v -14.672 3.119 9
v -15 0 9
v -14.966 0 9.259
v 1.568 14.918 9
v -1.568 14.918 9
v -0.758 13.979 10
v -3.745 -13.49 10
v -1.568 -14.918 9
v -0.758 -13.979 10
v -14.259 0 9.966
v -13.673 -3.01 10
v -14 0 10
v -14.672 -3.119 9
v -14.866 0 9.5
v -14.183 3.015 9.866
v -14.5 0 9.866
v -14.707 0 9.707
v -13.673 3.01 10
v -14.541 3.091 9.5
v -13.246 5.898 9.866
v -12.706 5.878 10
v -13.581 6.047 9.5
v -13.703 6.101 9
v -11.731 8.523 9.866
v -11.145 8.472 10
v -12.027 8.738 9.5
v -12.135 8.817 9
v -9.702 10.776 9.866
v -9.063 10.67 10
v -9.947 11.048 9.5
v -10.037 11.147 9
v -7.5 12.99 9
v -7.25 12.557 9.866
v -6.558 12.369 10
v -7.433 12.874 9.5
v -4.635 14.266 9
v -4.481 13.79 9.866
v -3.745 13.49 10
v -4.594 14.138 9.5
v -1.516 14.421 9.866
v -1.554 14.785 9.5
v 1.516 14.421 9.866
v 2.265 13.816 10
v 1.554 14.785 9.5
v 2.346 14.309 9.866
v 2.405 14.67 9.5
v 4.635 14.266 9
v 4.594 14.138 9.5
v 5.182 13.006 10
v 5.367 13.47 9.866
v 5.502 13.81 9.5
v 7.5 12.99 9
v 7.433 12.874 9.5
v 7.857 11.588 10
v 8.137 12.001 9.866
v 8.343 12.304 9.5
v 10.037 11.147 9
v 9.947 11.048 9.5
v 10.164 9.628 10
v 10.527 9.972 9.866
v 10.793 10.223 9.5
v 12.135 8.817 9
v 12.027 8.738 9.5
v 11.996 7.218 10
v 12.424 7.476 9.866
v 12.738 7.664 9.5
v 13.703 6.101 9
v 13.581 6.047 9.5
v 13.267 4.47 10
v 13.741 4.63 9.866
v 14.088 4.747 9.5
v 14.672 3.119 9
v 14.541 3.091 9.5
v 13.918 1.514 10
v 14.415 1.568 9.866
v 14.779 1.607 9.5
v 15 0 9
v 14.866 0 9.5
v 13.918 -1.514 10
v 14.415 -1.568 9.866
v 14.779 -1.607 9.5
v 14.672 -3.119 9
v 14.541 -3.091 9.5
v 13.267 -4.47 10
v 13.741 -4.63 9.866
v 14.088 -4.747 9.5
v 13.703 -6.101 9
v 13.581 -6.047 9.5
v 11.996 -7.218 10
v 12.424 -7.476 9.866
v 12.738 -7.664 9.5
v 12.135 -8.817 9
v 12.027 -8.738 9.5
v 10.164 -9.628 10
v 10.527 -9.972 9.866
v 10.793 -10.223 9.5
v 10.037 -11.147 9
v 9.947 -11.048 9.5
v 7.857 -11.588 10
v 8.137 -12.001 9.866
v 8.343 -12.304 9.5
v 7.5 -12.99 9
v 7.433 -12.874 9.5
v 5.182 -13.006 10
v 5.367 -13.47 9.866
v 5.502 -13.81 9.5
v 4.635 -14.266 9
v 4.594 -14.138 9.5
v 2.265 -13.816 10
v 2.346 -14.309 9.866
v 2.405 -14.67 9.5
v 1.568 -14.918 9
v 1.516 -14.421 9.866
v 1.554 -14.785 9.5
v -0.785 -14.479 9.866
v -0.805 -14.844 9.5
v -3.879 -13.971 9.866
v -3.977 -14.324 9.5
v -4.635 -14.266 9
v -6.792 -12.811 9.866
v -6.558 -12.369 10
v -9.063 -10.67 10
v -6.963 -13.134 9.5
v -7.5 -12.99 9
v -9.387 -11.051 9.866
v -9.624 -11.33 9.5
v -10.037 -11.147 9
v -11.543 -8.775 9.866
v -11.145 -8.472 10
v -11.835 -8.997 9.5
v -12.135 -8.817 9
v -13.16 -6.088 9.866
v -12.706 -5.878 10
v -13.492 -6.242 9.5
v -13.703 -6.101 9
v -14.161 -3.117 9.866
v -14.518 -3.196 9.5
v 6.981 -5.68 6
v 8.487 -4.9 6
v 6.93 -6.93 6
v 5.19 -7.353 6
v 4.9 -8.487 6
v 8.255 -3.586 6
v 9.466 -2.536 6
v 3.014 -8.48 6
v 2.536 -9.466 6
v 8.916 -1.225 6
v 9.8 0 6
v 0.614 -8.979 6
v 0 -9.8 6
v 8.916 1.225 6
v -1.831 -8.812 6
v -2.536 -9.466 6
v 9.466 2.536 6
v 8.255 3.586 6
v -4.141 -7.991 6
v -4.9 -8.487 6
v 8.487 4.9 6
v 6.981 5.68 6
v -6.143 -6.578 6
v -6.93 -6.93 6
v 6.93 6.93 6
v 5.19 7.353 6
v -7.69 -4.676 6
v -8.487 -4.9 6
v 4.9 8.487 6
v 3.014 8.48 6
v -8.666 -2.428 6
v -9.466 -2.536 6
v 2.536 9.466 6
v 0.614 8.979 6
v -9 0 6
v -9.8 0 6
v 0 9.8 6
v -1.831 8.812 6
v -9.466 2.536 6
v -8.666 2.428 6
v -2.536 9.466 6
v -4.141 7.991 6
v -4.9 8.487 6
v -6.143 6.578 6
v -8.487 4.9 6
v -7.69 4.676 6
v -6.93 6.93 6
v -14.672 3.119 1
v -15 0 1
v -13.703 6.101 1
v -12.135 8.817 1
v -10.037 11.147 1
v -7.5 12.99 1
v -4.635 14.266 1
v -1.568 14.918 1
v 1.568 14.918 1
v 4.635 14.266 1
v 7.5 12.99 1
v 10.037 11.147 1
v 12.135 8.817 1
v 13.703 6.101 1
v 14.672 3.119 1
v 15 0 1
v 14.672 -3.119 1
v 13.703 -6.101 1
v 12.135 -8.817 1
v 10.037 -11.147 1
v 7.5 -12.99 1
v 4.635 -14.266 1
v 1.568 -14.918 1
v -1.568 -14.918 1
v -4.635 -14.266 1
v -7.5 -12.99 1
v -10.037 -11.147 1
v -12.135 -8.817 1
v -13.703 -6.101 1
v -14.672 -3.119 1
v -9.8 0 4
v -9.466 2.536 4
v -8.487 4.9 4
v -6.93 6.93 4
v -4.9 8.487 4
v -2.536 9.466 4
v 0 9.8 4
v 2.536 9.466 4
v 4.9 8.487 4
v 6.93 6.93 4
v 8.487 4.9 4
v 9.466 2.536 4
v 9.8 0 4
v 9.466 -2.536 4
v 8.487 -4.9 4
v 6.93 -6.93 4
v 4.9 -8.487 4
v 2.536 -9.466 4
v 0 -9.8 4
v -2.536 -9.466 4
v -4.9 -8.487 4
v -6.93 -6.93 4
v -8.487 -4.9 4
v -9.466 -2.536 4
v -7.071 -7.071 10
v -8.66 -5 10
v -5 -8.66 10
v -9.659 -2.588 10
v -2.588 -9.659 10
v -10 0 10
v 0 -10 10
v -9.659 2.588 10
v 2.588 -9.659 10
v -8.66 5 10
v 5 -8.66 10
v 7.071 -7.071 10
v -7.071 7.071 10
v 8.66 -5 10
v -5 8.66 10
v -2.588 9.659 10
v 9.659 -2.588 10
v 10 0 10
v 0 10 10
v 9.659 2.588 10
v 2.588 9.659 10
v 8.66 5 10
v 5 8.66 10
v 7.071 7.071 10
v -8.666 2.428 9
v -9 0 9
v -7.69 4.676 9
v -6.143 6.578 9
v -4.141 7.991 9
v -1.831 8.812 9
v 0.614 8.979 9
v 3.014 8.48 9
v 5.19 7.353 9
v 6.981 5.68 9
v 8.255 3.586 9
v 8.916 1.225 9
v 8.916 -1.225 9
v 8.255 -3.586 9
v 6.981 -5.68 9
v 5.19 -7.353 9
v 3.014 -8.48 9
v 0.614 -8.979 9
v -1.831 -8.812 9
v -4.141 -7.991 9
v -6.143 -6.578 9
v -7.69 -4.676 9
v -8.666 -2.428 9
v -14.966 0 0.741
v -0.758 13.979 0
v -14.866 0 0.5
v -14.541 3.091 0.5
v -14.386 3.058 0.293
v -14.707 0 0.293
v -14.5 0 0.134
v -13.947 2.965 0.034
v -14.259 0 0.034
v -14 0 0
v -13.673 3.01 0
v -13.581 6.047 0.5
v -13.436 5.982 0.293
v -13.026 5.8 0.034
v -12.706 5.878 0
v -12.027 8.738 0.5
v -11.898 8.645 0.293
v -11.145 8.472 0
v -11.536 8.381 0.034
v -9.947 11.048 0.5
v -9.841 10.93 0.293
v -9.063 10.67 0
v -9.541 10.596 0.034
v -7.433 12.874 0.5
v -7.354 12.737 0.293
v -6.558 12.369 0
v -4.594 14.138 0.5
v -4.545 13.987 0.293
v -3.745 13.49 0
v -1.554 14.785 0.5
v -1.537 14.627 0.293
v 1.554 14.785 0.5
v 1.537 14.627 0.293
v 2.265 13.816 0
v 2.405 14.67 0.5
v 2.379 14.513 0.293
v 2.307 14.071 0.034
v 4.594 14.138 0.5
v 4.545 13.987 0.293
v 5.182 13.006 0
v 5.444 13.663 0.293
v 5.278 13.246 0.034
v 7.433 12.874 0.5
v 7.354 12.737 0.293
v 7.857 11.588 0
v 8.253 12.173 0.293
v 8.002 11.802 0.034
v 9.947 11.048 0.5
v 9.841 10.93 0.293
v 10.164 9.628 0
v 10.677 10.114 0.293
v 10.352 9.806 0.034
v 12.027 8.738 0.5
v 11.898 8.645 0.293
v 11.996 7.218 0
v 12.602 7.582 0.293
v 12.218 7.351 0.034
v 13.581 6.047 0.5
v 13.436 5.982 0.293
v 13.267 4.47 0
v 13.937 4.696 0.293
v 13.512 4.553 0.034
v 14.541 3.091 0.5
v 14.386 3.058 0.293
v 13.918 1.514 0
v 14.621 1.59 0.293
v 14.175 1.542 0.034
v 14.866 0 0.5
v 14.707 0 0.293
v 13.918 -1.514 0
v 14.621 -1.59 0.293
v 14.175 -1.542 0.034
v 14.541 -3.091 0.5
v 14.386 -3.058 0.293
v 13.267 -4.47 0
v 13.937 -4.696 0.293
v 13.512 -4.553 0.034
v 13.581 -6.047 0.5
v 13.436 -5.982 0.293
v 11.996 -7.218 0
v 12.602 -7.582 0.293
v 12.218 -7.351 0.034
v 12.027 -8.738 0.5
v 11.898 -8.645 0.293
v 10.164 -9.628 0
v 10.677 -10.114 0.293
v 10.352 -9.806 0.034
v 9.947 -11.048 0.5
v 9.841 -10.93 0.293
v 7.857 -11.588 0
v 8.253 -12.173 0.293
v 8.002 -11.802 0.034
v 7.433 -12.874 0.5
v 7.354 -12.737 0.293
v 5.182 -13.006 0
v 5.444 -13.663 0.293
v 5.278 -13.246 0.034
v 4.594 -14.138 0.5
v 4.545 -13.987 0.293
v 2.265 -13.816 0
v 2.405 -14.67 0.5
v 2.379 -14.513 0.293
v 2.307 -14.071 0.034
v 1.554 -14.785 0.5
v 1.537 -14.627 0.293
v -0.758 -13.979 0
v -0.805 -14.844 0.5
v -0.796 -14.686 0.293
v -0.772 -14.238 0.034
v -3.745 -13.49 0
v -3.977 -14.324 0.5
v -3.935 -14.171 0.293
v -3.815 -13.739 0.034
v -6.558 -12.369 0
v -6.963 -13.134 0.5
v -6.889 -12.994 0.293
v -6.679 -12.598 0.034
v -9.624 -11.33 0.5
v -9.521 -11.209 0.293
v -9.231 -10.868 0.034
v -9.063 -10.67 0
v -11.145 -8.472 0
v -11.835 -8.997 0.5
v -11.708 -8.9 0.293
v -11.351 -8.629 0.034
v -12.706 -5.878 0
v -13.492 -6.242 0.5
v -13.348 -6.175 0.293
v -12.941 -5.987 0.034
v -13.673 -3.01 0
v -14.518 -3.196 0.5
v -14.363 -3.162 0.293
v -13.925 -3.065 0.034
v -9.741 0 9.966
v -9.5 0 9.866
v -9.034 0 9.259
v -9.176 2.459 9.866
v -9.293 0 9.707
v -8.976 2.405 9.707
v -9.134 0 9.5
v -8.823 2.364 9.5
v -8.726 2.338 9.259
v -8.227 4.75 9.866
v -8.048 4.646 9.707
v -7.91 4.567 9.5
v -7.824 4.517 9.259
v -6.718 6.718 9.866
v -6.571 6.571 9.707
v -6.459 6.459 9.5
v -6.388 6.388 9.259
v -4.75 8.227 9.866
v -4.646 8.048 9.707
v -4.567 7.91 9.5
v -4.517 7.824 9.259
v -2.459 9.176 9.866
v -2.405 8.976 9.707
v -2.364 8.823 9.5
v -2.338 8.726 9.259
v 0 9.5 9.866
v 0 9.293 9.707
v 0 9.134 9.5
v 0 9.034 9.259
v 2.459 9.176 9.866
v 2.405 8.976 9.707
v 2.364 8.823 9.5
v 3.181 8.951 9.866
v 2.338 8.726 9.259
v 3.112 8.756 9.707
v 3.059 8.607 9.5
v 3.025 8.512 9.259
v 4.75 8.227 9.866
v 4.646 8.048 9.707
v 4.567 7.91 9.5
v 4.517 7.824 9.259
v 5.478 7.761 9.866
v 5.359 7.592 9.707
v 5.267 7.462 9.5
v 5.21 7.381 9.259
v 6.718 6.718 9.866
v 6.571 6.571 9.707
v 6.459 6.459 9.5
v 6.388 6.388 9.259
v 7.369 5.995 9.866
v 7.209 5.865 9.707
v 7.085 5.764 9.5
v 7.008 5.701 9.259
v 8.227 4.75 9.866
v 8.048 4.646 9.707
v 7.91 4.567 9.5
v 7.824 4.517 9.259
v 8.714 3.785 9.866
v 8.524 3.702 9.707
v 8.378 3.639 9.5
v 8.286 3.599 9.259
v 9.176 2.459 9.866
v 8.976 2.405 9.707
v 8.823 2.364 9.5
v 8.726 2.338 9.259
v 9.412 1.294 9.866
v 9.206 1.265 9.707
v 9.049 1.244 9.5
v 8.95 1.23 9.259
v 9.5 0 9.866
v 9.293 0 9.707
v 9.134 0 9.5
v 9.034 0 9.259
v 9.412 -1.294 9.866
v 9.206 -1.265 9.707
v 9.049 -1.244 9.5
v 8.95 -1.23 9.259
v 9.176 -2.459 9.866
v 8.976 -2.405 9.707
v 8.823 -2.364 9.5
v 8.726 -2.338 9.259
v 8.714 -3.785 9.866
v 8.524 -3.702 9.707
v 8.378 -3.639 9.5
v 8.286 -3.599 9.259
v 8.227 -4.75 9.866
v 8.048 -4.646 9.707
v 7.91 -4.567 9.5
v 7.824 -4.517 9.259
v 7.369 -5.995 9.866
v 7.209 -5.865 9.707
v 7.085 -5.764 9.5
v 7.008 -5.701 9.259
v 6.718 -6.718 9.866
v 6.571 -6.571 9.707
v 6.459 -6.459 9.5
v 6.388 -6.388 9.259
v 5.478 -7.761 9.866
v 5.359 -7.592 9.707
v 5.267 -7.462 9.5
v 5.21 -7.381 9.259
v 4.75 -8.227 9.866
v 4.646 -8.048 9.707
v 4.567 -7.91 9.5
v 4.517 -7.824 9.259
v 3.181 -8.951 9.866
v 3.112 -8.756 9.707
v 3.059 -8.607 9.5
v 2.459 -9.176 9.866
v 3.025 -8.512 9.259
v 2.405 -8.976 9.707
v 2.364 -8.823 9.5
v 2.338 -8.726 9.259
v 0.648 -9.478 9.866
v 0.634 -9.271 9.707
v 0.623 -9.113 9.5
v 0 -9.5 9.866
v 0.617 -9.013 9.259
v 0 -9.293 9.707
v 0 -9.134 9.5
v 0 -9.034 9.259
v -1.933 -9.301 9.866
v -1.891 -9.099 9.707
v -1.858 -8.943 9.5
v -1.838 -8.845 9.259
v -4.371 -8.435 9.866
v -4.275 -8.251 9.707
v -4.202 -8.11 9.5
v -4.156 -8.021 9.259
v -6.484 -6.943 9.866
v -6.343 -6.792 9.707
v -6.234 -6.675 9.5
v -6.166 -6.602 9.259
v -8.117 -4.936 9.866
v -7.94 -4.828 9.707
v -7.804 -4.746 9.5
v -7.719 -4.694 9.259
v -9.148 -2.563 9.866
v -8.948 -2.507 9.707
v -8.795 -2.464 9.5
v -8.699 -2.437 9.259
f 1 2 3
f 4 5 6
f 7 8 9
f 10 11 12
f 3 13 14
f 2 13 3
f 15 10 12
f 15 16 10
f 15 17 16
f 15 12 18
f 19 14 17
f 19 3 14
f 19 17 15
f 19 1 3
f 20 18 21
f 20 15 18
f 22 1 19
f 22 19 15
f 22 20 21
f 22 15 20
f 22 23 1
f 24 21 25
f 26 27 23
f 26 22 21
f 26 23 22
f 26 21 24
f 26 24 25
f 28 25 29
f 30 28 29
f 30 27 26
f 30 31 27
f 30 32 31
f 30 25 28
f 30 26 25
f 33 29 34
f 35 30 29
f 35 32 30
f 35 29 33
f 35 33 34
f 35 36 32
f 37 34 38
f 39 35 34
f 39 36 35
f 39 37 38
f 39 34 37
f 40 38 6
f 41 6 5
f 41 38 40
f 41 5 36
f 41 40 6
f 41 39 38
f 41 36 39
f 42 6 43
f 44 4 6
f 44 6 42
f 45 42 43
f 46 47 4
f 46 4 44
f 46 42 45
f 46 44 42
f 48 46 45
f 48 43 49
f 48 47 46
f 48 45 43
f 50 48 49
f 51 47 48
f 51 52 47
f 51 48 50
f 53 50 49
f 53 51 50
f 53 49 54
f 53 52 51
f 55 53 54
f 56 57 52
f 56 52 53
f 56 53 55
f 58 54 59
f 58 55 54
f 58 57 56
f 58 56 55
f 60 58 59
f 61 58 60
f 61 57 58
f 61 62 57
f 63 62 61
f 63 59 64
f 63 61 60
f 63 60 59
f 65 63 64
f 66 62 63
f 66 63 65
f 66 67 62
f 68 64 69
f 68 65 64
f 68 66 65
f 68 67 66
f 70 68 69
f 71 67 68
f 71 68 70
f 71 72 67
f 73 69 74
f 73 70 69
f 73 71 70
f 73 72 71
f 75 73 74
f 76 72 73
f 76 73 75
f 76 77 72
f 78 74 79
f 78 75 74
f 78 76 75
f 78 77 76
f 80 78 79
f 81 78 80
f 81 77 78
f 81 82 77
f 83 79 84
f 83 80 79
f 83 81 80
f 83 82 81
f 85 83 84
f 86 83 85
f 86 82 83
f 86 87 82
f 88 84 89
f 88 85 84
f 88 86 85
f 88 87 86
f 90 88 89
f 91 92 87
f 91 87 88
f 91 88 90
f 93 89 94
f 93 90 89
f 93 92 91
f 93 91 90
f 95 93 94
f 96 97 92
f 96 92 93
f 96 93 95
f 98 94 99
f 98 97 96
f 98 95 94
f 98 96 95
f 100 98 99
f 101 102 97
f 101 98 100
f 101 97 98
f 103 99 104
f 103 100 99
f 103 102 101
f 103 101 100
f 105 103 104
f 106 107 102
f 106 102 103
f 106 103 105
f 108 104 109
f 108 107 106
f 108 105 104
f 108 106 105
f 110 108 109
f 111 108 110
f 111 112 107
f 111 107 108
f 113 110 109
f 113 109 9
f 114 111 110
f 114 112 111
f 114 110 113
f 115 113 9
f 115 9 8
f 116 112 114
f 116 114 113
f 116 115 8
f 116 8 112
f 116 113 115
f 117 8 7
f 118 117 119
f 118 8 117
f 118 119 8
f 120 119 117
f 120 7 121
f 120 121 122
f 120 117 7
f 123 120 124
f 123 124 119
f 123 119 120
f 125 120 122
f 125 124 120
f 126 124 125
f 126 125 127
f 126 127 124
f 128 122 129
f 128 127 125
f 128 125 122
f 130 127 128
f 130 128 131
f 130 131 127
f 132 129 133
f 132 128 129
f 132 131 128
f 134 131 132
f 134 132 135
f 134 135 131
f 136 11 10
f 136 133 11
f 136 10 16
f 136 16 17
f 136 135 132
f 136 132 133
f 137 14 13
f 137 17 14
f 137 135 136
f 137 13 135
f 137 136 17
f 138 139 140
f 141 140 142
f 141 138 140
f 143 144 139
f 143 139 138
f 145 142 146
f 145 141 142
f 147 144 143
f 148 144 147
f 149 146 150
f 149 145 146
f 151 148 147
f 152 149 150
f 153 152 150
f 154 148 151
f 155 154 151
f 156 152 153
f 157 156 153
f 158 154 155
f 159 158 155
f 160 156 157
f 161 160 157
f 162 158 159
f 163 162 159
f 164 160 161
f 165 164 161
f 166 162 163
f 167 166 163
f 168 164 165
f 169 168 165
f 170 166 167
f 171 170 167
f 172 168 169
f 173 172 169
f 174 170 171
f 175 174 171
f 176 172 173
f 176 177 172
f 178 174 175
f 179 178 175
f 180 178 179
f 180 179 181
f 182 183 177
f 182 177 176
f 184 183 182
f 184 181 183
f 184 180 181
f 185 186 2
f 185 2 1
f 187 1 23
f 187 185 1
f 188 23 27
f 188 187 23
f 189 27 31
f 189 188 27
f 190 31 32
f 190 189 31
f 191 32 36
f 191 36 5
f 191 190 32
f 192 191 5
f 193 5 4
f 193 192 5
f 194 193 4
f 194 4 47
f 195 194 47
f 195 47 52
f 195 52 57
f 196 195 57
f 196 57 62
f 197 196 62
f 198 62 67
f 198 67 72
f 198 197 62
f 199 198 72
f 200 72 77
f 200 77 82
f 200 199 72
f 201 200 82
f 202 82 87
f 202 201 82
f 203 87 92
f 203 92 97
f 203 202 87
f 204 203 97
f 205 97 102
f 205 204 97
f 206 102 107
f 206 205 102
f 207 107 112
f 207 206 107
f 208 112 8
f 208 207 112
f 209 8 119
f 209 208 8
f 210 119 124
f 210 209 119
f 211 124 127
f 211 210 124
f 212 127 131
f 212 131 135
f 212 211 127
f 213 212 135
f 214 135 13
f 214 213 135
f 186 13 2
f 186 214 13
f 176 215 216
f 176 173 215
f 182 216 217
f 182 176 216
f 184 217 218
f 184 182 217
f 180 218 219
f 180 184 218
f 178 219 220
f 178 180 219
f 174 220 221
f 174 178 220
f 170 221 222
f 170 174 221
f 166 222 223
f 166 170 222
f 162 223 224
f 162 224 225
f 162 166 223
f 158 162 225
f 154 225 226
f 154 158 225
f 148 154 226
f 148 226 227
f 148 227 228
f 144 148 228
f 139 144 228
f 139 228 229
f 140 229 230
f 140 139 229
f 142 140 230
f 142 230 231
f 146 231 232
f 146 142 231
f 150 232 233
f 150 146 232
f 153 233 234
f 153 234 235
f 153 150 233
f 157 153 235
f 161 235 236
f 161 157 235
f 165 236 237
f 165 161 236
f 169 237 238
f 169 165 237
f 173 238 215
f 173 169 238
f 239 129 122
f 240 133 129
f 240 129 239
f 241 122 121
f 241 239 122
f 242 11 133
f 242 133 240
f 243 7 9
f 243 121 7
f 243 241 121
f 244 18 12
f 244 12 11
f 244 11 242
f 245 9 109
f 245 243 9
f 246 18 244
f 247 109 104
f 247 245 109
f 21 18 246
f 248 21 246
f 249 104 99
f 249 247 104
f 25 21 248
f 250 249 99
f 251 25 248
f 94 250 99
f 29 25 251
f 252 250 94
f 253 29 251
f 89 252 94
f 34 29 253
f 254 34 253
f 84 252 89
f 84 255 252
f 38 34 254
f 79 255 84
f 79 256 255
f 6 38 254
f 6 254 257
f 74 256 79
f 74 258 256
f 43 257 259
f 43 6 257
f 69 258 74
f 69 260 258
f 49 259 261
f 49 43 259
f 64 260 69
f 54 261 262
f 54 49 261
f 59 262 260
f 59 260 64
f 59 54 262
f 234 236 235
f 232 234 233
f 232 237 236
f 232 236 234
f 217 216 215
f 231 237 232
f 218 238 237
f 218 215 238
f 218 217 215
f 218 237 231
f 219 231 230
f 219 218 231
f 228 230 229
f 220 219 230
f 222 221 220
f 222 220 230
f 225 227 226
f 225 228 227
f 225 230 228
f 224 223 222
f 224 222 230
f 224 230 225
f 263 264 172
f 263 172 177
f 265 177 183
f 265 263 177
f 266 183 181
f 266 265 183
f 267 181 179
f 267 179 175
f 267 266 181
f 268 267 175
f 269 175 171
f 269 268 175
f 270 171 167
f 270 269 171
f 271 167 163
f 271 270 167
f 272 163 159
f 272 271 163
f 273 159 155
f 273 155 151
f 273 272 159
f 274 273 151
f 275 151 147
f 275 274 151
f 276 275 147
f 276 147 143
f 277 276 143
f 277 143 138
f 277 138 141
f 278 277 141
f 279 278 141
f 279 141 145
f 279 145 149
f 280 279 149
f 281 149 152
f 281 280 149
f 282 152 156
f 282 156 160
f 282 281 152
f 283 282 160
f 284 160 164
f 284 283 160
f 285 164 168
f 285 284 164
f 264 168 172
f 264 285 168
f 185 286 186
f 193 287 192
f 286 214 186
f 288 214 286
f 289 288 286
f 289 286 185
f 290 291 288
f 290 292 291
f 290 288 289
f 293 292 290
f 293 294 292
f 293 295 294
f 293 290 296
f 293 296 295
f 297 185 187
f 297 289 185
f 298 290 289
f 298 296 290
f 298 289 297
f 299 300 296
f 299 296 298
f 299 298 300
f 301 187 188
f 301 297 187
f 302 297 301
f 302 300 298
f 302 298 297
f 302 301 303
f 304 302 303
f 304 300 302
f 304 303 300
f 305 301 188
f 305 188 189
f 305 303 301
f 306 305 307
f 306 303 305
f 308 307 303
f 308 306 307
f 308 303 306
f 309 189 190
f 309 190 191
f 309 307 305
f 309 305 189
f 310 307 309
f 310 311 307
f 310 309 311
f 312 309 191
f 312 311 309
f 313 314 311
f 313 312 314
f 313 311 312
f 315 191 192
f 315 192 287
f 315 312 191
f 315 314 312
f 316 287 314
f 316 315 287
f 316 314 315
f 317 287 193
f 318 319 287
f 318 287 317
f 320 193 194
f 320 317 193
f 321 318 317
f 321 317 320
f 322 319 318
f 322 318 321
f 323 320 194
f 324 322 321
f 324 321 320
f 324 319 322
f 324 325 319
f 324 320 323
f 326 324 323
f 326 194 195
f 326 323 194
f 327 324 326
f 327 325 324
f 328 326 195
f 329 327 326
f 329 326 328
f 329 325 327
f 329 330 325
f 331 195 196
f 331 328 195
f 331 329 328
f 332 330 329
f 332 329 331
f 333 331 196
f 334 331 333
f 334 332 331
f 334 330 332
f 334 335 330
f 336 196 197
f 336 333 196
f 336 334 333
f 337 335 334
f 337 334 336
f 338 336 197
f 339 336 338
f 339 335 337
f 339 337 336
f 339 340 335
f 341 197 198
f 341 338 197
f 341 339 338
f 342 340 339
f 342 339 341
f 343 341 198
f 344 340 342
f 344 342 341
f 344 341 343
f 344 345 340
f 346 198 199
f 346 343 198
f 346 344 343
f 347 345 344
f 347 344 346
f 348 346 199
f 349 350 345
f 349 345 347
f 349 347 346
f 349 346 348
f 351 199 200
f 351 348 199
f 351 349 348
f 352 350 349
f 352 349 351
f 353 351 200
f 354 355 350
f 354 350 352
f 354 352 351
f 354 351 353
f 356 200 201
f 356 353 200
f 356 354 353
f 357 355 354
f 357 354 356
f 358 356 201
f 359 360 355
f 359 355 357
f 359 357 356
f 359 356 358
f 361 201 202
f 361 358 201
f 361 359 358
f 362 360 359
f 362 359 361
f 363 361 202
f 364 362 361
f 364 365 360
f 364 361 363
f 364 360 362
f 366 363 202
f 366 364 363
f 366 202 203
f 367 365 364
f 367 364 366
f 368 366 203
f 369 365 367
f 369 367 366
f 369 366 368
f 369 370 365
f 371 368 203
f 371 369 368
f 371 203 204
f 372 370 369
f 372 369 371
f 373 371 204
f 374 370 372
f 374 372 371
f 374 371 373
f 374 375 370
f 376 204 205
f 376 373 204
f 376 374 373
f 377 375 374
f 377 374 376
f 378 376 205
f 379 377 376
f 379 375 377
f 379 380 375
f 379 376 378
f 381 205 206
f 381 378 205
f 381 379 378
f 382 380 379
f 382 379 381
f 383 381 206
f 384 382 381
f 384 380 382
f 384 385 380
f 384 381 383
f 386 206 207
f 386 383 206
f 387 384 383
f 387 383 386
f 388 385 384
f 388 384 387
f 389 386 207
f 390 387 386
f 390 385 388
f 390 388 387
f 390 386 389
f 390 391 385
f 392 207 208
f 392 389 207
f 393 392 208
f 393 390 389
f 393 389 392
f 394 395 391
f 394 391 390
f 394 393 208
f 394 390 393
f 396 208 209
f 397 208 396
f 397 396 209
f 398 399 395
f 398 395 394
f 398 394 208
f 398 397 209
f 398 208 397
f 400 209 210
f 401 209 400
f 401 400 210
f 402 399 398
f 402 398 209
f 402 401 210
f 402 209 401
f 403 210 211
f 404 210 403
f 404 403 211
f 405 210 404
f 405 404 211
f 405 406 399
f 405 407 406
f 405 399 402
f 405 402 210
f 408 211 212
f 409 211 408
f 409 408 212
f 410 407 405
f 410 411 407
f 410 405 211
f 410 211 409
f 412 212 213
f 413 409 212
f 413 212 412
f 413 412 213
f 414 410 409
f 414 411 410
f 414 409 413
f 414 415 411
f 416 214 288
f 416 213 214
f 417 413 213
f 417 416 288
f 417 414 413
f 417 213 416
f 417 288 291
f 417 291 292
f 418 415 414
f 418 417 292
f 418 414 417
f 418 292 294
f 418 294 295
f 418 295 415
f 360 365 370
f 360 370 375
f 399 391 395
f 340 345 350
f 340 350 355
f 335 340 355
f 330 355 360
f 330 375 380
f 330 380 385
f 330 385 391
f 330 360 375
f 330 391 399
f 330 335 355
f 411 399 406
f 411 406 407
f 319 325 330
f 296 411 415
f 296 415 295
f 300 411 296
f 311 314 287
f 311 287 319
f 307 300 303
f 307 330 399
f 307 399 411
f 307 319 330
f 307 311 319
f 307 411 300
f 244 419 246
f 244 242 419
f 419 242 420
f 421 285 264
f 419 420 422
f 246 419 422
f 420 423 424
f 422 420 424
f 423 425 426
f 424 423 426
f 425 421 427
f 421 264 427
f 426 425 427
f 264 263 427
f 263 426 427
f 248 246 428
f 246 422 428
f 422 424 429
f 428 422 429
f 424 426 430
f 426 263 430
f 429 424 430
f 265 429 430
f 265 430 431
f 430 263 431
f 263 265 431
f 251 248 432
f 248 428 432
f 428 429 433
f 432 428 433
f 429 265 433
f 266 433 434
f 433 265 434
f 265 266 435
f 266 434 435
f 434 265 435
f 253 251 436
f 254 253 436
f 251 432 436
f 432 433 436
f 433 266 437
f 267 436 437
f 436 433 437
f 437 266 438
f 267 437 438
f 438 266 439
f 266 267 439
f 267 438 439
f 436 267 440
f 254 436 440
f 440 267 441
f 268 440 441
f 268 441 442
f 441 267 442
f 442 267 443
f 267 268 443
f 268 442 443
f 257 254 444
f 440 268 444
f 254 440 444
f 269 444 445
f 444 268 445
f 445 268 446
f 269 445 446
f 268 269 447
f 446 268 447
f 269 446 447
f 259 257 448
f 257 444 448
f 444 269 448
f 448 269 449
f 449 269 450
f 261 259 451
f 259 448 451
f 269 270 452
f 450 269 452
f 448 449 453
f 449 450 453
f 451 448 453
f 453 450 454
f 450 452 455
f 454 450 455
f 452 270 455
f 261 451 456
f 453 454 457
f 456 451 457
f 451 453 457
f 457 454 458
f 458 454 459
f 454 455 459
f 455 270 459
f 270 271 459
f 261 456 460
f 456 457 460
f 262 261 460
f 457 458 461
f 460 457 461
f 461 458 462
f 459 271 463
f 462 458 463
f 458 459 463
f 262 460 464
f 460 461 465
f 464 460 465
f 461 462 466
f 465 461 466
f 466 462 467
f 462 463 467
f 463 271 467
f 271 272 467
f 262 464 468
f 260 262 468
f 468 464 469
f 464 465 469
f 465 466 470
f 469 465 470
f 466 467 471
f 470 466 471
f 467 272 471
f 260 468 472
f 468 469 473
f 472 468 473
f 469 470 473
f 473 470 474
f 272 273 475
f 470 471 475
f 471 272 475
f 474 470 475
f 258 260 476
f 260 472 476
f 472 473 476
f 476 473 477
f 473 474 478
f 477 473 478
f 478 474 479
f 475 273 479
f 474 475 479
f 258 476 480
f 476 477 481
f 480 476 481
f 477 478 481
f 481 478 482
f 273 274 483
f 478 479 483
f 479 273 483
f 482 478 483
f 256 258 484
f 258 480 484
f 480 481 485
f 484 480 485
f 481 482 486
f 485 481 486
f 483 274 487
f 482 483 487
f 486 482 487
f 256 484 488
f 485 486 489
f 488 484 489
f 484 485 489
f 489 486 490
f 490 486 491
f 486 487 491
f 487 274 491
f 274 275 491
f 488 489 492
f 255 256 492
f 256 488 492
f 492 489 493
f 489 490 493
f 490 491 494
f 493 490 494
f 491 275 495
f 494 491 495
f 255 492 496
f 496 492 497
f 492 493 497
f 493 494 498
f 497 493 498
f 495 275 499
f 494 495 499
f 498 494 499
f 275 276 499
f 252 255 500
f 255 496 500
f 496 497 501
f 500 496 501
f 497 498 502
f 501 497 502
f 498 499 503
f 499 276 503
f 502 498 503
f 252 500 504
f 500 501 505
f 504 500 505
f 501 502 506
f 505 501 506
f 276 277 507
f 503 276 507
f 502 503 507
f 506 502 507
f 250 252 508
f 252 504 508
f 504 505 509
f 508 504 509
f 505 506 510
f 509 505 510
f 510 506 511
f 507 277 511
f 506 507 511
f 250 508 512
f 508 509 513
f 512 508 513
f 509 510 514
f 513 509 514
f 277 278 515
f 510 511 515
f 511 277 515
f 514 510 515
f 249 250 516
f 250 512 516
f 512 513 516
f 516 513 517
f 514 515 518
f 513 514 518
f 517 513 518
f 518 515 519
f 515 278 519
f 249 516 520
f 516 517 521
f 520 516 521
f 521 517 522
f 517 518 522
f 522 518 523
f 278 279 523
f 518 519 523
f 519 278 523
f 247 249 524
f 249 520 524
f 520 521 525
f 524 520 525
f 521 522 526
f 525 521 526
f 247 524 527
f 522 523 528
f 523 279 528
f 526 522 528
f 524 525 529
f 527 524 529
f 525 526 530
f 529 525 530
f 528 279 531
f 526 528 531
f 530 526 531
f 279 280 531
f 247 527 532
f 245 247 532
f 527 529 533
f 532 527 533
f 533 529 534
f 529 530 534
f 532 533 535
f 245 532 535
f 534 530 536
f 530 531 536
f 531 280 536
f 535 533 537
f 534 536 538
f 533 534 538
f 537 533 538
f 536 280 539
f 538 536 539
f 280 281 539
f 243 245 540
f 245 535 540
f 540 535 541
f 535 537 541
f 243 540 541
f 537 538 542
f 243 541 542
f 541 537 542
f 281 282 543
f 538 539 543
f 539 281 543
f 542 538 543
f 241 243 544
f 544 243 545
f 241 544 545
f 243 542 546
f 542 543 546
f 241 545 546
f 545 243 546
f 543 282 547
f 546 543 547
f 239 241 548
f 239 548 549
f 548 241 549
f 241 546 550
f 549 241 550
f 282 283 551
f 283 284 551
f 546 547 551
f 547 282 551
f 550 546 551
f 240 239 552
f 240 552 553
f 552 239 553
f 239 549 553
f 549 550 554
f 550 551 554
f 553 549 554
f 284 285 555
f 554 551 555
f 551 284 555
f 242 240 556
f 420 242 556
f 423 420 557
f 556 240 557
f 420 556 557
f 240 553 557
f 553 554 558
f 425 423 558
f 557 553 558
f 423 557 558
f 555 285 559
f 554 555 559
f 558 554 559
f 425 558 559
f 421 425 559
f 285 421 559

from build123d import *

# Parameters (mm, degrees)
F2_R = 1
F3_R = 1
F4_R = 1


with BuildPart() as f1:
    # F0 (on Front) → F1 (revolve)
    with BuildSketch(Plane.XZ):
        Polygon((-15, 0), (0, 0), (0, 4), (-9.8, 4), (-9.8, 6), (-9, 6), (-9, 10), (-15, 10), align=None)
    revolve(axis=Axis((0, 0, 2), (0, 0, -1)))

    # F2
    f2_edges = [f1.edges().sort_by_distance(p)[0] for p in [
        (15, 0, 10),
    ]]
    fillet(f2_edges, radius=F2_R)

    # F3
    f3_edges = [f1.edges().sort_by_distance(p)[0] for p in [
        (9, 0, 10),
    ]]
    fillet(f3_edges, radius=F3_R)

    # F4
    f4_edges = [f1.edges().sort_by_distance(p)[0] for p in [
        (15, 0, 0),
    ]]
    fillet(f4_edges, radius=F4_R)


solid = f1.part
